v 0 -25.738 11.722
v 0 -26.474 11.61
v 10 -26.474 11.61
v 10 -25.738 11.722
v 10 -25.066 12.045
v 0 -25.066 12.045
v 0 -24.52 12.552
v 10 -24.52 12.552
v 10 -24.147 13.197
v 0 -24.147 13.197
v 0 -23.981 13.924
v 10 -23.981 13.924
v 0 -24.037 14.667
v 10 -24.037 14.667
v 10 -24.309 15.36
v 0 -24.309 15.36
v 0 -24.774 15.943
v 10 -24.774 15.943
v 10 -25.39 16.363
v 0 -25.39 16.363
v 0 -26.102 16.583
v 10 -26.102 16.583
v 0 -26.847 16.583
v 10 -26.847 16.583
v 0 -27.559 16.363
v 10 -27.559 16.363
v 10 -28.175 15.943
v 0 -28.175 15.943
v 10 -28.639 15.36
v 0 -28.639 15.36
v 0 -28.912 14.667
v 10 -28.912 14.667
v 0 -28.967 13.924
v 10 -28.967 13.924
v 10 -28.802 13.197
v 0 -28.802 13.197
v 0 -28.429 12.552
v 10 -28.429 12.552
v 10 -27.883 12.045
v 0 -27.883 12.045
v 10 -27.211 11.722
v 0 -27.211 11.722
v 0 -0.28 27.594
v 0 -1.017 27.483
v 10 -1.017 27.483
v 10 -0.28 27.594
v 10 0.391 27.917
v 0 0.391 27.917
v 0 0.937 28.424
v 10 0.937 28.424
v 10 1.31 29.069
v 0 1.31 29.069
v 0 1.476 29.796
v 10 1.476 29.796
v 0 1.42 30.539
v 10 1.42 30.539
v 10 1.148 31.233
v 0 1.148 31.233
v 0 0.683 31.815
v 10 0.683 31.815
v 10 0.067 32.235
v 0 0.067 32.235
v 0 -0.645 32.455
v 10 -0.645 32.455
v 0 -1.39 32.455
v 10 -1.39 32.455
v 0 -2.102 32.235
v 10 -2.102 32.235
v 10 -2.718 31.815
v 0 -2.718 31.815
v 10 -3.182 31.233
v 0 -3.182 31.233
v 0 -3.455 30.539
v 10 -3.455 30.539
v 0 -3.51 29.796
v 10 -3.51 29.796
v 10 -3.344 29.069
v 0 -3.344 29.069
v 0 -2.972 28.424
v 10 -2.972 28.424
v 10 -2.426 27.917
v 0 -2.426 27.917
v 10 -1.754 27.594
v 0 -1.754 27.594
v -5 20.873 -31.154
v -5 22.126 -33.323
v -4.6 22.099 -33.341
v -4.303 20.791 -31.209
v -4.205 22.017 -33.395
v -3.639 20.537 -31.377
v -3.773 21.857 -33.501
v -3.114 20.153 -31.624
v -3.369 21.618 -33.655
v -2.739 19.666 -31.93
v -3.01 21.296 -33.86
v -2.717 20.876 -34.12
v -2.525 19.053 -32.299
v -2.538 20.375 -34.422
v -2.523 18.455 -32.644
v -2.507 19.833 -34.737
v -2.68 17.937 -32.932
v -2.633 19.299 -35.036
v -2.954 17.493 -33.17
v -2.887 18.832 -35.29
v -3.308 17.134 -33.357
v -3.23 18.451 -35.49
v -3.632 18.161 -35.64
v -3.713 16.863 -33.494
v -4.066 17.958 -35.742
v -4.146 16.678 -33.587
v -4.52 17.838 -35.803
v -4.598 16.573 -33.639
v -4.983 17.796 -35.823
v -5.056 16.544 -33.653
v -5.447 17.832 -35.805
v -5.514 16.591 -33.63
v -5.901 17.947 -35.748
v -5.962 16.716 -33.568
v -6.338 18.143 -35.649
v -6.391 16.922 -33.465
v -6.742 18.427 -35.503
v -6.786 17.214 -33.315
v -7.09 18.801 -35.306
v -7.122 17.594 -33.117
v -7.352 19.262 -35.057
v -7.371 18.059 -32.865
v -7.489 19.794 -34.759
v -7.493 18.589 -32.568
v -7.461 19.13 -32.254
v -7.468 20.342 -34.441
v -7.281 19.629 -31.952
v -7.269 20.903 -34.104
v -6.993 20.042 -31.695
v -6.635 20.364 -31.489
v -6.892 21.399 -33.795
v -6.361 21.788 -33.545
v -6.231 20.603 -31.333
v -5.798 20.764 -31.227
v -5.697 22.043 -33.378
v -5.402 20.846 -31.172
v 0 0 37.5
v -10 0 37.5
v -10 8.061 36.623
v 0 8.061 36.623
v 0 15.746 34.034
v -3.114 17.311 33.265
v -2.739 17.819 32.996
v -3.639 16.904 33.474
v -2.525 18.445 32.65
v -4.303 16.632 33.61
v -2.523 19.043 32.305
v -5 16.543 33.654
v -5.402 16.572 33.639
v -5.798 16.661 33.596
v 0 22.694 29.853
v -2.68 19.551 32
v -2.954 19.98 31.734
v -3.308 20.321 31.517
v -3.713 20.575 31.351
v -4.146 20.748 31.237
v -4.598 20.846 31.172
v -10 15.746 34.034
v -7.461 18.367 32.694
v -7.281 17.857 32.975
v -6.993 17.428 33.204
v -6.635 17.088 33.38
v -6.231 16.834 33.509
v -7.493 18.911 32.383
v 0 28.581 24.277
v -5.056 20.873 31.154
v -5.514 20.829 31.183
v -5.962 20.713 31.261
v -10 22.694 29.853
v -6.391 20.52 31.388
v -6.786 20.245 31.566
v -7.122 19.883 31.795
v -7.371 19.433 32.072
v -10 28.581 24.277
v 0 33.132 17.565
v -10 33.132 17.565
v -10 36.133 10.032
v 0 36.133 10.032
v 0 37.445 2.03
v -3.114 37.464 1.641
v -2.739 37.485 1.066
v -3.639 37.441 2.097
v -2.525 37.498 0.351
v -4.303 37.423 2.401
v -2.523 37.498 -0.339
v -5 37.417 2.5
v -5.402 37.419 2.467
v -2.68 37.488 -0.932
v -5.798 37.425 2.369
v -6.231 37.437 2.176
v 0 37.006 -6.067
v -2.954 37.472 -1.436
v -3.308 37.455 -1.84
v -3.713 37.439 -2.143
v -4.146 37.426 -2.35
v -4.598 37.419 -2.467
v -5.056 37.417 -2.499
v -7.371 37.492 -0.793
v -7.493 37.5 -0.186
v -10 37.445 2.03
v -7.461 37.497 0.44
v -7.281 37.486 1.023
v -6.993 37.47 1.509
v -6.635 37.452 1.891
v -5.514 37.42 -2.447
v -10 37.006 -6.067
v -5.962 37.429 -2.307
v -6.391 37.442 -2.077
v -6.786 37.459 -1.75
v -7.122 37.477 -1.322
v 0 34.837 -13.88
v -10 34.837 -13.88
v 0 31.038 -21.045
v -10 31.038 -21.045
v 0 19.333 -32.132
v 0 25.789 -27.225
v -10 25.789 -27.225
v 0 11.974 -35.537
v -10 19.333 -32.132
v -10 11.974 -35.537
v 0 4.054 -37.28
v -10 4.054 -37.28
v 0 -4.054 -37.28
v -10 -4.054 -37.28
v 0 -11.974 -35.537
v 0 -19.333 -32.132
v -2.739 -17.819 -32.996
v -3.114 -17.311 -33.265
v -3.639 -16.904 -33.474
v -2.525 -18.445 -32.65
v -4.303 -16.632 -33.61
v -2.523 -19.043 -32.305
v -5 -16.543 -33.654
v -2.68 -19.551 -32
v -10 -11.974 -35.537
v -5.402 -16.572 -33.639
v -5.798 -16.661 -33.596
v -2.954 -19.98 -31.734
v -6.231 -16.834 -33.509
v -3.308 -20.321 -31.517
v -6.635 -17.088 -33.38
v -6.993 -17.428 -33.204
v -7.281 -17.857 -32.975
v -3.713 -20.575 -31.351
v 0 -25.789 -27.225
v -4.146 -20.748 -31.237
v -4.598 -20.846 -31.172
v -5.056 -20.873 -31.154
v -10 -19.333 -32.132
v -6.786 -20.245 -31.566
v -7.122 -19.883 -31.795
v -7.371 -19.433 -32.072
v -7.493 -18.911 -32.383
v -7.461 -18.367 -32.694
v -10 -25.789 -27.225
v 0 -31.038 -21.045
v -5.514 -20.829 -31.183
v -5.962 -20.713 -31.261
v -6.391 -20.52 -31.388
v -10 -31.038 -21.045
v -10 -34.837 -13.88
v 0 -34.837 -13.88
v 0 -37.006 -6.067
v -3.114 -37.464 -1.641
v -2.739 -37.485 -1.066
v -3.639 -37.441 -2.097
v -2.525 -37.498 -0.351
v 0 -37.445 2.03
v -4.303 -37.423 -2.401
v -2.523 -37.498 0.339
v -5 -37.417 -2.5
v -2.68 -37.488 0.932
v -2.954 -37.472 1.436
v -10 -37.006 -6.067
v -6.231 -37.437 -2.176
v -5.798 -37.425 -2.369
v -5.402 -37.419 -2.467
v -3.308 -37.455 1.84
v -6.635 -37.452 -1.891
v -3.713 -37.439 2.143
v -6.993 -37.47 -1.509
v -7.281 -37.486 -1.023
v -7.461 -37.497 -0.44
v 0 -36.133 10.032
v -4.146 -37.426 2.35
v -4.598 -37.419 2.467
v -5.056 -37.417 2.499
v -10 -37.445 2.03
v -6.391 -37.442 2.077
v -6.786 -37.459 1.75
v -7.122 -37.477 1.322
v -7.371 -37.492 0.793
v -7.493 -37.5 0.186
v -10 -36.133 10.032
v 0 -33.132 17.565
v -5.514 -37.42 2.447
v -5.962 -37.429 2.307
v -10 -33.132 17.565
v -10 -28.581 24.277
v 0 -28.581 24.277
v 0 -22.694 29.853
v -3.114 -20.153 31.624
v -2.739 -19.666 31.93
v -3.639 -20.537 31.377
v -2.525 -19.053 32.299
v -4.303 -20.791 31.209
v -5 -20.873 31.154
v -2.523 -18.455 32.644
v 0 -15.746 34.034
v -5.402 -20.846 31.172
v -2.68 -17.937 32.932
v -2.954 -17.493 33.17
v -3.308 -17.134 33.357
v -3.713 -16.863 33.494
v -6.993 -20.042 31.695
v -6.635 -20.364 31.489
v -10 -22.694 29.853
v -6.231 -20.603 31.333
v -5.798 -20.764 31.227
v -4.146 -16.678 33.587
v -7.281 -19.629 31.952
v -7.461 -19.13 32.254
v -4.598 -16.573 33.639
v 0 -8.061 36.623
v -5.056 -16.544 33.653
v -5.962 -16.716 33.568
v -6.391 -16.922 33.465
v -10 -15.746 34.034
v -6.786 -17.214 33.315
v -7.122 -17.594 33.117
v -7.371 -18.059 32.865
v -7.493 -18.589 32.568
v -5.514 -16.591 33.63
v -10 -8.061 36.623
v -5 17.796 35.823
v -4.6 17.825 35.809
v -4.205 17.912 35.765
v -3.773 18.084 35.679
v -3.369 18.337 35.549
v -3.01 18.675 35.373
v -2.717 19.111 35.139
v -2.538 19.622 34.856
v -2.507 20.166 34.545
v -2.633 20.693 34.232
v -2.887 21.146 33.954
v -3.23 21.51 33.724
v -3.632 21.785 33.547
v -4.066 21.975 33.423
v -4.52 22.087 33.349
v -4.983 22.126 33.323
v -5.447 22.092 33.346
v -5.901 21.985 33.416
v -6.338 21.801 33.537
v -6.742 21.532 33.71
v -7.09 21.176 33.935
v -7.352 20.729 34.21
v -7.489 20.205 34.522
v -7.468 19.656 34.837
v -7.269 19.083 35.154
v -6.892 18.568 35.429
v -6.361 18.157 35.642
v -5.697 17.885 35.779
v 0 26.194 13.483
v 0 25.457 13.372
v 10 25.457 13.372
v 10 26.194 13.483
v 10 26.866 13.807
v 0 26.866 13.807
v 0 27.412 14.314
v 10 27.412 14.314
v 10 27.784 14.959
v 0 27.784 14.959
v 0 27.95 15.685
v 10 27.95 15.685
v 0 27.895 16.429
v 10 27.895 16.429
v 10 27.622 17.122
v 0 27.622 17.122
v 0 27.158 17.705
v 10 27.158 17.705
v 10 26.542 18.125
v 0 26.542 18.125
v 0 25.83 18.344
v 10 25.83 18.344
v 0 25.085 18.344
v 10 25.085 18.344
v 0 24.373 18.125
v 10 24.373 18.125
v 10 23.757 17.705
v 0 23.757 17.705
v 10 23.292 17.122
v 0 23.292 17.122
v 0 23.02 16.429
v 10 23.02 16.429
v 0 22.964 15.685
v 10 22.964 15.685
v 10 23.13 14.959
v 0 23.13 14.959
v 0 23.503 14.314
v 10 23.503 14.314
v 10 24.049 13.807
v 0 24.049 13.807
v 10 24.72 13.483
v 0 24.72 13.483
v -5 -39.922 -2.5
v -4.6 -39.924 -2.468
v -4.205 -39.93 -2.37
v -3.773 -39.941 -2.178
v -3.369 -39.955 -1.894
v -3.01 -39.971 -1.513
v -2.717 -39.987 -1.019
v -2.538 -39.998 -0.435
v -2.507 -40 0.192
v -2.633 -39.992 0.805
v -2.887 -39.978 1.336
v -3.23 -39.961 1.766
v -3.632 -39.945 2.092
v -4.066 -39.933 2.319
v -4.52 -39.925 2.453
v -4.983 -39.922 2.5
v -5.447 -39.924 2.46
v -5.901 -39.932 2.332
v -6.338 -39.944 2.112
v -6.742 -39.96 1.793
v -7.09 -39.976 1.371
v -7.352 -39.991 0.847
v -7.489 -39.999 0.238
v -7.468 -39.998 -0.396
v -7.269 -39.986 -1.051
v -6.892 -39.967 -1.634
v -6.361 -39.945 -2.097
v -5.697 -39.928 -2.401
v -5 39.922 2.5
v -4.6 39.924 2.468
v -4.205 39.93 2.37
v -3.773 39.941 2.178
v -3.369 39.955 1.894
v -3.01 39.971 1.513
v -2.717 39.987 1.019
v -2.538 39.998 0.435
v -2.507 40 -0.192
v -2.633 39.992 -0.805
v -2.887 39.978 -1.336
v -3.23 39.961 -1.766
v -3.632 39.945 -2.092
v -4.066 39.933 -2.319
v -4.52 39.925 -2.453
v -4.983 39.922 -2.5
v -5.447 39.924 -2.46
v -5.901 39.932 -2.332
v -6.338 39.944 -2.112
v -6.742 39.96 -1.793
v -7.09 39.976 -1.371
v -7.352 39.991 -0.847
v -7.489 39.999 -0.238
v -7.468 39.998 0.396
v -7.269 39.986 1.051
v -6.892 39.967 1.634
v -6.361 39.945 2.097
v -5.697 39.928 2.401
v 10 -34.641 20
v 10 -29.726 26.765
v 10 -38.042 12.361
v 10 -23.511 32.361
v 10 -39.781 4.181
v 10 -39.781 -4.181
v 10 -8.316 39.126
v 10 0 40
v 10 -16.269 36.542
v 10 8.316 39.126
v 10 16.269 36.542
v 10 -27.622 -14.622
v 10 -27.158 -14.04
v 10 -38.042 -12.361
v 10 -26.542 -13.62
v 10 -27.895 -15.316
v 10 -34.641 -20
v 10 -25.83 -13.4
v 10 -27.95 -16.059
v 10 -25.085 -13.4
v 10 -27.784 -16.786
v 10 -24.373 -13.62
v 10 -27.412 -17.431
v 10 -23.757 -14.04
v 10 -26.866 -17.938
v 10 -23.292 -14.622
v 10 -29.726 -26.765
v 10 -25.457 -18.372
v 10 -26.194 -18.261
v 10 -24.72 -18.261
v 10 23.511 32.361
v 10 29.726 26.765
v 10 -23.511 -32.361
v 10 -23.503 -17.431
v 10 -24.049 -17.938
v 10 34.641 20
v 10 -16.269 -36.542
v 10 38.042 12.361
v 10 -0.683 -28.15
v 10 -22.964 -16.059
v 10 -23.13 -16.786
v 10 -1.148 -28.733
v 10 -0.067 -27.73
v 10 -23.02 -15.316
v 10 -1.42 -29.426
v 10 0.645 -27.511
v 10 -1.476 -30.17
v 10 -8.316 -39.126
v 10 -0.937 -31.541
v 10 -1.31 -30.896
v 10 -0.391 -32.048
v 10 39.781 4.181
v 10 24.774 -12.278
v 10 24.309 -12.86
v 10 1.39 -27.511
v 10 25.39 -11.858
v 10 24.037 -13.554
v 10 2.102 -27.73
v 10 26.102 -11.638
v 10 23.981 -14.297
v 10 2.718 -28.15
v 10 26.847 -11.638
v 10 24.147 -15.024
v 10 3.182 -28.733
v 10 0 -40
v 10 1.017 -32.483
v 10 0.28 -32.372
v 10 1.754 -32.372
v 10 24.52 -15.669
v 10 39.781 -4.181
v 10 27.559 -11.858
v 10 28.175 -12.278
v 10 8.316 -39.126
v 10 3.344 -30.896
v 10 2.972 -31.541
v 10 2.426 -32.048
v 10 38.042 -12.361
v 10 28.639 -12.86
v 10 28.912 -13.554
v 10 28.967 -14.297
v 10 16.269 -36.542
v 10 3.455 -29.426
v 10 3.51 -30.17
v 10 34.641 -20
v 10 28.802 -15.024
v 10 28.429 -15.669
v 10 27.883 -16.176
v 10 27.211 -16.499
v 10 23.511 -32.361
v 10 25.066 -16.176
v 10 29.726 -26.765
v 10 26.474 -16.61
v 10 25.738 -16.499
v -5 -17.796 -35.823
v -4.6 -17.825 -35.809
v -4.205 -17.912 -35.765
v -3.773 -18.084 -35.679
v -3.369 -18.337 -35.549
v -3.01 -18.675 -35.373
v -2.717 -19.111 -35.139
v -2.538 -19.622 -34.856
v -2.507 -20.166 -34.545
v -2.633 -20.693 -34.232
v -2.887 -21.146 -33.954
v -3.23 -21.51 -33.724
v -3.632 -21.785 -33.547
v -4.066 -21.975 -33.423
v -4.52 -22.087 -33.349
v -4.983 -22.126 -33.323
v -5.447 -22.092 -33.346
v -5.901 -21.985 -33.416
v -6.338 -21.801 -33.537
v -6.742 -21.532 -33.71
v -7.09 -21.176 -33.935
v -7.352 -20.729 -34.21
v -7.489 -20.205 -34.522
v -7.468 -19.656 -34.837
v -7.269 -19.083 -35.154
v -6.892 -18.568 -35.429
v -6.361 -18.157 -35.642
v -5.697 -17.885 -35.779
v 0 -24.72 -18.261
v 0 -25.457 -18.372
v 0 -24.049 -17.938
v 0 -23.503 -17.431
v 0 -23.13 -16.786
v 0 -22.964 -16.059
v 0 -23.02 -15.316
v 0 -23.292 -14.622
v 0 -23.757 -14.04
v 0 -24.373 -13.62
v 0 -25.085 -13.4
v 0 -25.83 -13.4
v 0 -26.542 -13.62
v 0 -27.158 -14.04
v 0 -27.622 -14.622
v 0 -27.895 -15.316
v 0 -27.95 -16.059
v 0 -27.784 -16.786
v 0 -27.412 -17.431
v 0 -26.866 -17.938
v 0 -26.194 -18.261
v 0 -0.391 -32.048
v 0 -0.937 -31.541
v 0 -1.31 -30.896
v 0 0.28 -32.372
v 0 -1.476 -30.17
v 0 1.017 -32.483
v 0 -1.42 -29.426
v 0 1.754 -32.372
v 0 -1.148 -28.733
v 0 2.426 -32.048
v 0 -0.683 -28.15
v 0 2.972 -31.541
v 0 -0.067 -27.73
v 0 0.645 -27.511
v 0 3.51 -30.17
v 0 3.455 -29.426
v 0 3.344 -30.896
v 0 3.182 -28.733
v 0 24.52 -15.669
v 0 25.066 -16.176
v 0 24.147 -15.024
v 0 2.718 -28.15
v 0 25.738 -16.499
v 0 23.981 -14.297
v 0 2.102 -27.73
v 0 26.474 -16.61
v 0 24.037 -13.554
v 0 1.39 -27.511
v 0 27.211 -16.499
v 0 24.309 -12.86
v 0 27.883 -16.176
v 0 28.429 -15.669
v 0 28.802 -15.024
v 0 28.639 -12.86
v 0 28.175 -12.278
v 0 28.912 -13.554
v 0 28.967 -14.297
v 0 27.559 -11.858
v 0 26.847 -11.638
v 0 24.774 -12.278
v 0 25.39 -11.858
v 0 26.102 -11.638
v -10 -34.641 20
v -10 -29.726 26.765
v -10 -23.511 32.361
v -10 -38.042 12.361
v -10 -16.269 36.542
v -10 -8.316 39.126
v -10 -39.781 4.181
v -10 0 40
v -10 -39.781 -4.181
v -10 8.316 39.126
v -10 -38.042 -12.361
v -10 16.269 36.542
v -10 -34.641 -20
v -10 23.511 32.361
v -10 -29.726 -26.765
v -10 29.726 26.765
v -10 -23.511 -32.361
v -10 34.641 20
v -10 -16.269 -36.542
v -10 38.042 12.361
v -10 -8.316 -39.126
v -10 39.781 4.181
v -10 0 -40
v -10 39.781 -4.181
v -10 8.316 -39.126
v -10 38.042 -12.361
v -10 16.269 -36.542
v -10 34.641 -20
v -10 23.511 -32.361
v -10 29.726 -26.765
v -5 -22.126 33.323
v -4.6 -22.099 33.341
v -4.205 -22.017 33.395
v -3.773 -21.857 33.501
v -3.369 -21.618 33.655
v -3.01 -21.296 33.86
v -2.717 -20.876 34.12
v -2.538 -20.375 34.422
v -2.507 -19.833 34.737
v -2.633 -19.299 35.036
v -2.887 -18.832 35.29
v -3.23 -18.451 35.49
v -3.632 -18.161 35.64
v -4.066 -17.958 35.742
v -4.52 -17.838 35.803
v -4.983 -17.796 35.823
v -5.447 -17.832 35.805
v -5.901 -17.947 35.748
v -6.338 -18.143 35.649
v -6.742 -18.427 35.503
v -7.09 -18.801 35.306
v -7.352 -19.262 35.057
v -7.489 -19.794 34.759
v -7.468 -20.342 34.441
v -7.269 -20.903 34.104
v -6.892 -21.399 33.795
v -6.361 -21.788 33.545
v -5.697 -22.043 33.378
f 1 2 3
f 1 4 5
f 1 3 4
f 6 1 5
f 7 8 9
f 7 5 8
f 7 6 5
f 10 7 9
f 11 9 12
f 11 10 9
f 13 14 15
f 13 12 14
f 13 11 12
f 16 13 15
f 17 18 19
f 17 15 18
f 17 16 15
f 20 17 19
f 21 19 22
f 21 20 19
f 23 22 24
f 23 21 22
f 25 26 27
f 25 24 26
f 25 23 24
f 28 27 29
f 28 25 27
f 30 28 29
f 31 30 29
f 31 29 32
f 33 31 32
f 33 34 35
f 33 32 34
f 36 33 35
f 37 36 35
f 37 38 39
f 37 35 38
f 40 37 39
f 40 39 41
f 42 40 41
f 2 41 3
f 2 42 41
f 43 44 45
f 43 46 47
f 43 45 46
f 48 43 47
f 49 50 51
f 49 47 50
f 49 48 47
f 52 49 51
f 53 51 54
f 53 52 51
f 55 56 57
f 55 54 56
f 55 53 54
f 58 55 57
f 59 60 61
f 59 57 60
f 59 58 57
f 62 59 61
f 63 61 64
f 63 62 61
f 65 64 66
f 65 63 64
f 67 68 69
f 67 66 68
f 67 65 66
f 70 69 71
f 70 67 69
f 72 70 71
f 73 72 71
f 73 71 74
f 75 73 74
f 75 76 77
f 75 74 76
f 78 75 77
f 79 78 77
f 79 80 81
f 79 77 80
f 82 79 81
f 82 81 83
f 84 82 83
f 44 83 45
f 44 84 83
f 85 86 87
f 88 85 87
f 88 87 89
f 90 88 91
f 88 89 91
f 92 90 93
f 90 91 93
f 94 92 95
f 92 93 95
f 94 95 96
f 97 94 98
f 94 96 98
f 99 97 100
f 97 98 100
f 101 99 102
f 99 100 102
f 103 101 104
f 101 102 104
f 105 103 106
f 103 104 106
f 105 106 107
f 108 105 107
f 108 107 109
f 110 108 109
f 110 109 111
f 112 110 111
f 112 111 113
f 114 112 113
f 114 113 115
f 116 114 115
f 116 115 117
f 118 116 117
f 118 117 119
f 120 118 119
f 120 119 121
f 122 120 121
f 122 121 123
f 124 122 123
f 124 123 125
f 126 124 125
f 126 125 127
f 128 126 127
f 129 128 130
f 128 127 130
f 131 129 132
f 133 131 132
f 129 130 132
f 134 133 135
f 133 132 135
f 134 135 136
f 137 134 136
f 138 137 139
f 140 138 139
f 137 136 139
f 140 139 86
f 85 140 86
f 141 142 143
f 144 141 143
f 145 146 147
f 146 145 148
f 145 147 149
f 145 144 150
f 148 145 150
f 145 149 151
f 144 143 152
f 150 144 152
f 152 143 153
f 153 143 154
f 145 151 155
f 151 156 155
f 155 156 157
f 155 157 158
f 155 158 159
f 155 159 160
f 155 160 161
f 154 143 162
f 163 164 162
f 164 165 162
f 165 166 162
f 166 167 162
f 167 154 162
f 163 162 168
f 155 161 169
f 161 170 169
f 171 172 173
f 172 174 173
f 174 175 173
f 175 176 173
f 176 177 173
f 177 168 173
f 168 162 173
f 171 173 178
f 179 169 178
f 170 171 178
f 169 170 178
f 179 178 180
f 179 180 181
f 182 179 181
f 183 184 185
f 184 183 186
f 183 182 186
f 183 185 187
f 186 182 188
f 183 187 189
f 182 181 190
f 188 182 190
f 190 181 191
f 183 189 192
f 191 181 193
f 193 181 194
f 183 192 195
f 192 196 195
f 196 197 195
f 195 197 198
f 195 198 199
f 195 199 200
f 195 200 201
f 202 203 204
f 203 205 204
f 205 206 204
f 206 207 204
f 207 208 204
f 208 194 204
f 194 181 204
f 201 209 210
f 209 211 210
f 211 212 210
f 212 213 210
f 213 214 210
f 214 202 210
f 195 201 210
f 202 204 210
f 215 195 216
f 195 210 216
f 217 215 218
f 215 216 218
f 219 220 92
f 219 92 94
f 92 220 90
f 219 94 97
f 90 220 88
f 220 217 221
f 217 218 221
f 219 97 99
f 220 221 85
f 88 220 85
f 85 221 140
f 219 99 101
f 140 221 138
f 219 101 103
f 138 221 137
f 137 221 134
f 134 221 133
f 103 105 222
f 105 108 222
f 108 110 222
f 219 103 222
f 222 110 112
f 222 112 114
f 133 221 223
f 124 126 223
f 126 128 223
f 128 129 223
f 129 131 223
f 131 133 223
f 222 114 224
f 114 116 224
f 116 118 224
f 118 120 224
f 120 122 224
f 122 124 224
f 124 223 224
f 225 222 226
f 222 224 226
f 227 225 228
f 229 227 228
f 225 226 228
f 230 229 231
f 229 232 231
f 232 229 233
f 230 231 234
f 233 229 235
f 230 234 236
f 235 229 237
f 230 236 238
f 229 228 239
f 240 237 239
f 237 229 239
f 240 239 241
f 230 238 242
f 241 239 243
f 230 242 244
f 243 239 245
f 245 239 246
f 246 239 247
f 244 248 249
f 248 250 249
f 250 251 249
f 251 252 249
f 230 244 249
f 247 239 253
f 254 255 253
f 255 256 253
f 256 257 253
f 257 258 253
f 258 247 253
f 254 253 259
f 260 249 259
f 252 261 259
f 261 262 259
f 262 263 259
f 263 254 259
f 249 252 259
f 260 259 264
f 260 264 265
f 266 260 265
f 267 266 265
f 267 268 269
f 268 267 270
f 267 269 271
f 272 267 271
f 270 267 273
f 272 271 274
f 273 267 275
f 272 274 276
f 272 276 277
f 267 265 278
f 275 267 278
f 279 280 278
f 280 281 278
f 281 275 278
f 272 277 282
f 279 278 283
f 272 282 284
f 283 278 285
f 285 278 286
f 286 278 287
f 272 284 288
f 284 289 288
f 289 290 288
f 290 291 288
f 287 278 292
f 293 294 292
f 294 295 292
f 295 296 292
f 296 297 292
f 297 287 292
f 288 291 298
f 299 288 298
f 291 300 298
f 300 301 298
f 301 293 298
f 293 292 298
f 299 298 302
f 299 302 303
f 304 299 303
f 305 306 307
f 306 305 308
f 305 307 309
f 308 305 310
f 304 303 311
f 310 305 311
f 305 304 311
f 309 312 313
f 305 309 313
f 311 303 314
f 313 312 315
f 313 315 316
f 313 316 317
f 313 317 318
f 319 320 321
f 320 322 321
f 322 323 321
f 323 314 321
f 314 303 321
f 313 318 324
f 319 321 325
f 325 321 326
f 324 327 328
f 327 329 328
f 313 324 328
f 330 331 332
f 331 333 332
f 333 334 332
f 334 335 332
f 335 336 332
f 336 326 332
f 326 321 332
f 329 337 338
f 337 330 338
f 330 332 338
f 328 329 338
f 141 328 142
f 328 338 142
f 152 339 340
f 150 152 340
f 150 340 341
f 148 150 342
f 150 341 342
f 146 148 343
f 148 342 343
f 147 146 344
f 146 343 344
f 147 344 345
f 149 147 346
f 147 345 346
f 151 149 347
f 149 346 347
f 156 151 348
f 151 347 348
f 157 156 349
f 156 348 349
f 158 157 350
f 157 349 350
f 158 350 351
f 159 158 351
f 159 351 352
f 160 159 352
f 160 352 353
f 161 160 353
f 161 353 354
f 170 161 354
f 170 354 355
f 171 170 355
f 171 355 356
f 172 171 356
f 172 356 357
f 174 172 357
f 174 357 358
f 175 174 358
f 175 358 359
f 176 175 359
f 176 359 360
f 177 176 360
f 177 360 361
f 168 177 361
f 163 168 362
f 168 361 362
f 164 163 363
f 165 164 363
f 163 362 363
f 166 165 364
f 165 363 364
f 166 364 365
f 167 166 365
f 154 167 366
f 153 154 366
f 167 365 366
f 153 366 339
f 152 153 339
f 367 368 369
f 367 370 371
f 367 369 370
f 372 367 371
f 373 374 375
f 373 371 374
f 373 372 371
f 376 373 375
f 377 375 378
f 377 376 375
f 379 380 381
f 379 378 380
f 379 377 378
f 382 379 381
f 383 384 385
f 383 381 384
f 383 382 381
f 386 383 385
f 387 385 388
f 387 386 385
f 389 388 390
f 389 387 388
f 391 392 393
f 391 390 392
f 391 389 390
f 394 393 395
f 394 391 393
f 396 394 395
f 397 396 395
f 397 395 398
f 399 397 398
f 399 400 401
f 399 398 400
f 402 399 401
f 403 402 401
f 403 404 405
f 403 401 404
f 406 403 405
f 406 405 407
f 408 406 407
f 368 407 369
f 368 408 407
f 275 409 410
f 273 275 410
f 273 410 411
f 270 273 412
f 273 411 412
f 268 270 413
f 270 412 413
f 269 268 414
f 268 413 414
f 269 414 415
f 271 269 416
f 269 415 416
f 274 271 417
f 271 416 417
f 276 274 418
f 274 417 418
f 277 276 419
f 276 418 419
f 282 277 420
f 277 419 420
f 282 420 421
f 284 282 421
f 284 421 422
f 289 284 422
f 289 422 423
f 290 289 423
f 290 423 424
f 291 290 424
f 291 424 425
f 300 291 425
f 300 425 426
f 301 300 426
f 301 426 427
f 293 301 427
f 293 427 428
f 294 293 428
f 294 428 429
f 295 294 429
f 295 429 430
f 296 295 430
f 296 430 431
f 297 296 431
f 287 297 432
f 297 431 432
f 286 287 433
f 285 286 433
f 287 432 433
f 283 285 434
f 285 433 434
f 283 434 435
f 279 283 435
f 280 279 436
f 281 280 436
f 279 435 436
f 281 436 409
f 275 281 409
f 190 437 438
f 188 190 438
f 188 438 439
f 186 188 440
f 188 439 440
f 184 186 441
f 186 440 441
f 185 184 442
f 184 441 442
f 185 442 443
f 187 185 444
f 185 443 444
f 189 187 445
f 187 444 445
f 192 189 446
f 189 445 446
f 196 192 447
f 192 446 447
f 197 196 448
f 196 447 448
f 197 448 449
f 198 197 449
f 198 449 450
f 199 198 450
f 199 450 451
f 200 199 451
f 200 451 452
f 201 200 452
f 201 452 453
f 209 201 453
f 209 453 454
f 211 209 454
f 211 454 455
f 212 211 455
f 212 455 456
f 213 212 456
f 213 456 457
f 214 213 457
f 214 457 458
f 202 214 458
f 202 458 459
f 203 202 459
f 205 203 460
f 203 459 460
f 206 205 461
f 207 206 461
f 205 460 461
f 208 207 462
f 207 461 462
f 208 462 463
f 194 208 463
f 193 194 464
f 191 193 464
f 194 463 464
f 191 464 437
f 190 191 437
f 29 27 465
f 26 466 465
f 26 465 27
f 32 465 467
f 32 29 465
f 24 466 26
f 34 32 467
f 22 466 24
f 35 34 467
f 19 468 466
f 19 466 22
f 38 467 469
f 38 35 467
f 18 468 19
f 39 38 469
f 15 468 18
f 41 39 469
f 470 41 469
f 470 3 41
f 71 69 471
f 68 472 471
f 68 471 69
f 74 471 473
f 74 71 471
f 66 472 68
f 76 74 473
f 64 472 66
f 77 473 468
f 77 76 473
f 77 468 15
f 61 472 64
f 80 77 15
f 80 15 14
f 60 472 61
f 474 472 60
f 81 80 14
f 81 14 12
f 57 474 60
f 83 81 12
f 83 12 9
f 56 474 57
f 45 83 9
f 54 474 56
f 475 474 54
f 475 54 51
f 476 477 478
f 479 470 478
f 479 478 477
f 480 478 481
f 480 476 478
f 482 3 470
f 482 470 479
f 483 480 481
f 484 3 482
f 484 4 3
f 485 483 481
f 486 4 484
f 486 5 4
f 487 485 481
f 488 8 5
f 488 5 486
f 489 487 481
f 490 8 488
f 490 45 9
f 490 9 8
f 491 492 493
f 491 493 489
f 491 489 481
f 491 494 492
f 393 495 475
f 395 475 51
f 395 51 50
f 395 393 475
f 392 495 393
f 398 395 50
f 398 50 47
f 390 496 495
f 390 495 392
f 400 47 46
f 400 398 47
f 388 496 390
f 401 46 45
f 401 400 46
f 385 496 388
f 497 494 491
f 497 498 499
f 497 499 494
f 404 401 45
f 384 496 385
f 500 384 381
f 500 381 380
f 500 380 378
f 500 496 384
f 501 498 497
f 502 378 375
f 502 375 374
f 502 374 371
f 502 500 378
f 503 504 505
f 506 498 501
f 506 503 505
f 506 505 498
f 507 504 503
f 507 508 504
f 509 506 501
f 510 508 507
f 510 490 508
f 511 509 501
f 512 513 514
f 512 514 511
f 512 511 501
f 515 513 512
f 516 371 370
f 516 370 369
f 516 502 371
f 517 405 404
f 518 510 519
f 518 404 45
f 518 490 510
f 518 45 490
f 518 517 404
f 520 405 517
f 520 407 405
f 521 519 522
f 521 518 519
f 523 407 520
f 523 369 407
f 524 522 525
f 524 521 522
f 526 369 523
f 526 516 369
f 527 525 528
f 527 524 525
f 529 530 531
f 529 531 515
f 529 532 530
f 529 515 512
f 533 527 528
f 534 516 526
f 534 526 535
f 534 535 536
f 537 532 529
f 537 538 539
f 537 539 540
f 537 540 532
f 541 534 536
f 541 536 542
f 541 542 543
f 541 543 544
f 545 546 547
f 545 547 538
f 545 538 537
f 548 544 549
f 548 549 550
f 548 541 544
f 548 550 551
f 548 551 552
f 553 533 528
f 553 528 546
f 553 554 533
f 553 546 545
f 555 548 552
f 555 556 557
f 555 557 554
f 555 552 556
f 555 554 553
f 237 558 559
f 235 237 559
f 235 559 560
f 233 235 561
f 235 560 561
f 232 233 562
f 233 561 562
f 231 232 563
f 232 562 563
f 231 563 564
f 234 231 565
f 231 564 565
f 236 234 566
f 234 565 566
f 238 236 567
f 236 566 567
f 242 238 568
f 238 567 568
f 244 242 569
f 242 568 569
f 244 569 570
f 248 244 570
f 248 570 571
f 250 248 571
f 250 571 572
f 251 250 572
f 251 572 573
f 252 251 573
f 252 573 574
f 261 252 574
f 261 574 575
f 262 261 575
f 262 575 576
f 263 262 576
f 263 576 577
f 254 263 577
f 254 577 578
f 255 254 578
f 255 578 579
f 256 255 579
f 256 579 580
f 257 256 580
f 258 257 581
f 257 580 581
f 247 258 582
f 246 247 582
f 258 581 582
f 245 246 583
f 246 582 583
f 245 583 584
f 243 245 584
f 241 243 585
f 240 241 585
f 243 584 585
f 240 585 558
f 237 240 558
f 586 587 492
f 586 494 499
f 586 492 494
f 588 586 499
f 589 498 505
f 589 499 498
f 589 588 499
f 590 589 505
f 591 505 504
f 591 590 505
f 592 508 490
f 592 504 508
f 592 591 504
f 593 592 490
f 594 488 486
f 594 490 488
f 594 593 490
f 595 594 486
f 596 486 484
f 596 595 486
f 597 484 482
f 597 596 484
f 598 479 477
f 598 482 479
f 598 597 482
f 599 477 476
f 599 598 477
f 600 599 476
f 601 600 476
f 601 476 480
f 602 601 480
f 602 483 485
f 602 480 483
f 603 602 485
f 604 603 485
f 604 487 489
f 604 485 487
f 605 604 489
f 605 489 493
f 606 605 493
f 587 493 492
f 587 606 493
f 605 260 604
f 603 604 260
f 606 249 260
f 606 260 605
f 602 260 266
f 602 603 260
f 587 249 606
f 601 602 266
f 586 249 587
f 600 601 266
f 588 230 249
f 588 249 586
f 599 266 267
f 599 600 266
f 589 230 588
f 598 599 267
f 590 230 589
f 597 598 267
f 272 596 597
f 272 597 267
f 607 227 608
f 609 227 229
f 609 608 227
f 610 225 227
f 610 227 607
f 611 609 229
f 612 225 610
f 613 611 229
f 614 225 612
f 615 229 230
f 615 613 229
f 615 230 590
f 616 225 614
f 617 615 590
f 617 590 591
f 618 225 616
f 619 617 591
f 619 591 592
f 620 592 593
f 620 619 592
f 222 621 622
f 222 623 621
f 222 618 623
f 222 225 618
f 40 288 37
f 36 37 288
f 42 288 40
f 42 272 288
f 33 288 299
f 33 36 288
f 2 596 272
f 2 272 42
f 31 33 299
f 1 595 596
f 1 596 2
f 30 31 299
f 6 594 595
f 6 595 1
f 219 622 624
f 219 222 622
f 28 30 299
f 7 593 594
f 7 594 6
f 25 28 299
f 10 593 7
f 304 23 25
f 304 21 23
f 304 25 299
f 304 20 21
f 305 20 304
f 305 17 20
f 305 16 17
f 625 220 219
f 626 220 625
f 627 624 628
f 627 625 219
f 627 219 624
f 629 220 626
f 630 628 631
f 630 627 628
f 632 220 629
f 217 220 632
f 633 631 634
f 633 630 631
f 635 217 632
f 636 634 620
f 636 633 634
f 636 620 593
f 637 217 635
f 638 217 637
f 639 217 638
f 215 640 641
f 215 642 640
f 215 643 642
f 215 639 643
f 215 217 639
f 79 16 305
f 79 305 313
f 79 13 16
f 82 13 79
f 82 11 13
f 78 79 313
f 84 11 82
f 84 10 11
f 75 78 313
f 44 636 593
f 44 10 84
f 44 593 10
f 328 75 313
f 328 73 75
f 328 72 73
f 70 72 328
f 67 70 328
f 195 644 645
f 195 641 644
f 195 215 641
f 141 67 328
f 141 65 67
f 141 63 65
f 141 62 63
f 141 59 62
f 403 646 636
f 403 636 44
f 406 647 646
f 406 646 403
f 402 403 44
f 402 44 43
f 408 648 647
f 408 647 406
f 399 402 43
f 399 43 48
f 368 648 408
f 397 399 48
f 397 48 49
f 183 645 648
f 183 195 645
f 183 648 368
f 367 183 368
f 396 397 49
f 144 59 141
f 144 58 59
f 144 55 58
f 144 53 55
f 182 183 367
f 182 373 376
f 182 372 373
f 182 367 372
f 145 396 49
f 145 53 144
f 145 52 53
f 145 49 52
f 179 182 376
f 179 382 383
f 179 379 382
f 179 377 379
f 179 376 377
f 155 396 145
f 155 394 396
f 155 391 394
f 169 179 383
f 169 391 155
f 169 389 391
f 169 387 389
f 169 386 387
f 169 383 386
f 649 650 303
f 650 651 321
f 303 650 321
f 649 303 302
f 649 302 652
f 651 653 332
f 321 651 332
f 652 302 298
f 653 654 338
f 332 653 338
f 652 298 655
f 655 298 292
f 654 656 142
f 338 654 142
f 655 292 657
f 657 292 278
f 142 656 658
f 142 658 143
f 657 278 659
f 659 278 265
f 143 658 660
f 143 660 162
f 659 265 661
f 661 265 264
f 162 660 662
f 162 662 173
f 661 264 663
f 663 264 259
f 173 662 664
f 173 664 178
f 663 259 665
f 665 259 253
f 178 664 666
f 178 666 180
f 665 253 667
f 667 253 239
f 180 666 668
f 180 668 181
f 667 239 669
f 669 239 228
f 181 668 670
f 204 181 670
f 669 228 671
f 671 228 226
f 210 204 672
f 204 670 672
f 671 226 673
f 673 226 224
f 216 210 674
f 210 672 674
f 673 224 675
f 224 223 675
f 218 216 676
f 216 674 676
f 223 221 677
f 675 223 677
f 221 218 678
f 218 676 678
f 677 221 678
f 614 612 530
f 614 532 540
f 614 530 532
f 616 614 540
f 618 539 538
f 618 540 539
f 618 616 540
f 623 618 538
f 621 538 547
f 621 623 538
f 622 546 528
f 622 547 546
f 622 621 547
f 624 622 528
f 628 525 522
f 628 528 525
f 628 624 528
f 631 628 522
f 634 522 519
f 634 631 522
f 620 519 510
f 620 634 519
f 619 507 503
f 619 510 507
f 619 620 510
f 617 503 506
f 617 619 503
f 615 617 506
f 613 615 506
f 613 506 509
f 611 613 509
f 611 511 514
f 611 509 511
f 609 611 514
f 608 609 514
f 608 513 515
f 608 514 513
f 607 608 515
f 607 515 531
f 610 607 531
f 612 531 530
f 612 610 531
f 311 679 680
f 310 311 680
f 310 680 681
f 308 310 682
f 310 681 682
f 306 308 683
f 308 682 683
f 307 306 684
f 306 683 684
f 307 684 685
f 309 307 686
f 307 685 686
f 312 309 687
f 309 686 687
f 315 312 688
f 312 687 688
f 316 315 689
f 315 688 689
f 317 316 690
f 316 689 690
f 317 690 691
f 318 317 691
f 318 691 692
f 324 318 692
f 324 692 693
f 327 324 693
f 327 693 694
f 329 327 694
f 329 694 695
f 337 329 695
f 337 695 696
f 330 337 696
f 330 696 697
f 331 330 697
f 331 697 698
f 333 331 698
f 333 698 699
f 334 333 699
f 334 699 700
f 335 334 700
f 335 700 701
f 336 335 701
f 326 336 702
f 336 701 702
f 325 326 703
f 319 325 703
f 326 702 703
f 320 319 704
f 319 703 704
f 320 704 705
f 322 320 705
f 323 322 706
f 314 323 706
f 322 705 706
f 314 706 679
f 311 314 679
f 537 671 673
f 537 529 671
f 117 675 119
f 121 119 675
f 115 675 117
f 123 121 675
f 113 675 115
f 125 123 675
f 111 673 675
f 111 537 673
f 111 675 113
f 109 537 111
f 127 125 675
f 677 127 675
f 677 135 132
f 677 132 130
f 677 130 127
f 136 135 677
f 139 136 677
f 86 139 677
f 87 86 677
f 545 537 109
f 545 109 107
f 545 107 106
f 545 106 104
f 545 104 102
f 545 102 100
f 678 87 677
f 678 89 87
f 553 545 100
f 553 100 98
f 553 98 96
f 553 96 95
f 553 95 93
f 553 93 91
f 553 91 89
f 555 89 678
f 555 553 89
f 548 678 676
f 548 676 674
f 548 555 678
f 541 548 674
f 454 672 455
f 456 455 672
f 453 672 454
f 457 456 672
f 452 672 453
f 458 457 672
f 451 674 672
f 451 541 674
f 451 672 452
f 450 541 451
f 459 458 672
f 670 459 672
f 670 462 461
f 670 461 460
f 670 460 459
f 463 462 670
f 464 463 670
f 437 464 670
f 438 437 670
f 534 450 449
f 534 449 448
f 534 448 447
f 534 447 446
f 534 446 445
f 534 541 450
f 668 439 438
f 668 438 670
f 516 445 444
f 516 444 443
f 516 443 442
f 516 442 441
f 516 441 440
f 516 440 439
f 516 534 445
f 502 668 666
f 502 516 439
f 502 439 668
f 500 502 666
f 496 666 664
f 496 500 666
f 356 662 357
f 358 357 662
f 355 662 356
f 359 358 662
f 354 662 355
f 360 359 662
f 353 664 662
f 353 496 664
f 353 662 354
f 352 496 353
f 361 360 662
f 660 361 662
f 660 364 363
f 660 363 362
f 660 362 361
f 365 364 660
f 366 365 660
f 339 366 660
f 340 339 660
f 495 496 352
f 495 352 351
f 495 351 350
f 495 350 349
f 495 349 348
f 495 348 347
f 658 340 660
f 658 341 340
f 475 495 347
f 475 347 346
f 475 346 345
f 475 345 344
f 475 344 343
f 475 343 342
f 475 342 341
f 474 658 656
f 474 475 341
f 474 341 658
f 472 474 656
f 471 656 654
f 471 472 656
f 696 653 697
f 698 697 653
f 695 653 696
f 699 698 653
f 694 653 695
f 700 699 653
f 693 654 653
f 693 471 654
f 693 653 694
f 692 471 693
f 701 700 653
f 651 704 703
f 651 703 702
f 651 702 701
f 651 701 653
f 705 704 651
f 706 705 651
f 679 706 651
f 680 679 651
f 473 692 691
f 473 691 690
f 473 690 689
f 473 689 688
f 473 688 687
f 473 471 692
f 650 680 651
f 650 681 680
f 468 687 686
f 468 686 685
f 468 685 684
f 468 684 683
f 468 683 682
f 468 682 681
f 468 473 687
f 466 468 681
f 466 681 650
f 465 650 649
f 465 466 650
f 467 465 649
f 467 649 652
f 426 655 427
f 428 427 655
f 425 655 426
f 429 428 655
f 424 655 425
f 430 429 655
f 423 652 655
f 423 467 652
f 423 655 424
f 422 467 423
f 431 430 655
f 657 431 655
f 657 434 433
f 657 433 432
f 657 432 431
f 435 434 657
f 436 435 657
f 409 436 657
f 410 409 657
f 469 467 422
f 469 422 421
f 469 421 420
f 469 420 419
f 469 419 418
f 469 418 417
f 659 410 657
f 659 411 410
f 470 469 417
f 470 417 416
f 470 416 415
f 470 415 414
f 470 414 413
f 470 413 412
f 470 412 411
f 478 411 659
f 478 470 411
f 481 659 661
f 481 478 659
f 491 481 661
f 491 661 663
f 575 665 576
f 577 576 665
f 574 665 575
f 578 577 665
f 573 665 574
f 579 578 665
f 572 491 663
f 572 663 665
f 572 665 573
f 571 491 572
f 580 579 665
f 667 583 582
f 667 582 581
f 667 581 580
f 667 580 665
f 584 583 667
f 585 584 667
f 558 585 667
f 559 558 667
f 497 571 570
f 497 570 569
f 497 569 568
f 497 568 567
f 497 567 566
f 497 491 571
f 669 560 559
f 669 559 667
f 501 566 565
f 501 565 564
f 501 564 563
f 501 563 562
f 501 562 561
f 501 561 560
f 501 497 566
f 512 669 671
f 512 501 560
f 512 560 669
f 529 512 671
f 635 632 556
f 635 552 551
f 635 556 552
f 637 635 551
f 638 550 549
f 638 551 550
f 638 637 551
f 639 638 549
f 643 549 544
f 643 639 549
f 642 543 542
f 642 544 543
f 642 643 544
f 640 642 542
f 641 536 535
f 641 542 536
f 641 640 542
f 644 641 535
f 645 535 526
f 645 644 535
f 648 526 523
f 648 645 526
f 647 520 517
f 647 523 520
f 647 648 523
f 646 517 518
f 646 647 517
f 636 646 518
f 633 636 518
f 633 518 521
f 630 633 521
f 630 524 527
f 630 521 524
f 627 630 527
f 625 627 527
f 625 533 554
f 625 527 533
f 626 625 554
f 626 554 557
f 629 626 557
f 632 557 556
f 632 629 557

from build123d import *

# Parameters (mm, degrees)
SKETCH1_R               = 40
BOSS_EXTRUDE2_DEPTH     = 10
CUT_EXTRUDE1_DEPTH      = 58.445626465
CUT_EXTRUDE1_DEPTH_BACK = 58.445626465
SKETCH2_R               = 2.5
SKETCH3_R               = 37.5
CUT_EXTRUDE2_DEPTH      = 10
CUT_EXTRUDE3_REACH      = 92
CUT_EXTRUDE3_END_RADIUS = 37.5
SKETCH4_R               = 2.5
CIRPATTERN1_COUNT       = 6


with BuildPart() as part:
    # Sketch1 → Boss-Extrude2 (new, symmetric)
    with BuildSketch(Plane(origin=(0, 0, 0), x_dir=(0, 0, -1), z_dir=(1, 0, 0))):
        Circle(SKETCH1_R)
    extrude(amount=BOSS_EXTRUDE2_DEPTH, both=True)

    # Sketch2 → Cut-Extrude1 (cut, two sides: drawn at the far end of the back side and taken through both)
    with BuildSketch(Plane(origin=(0, 0, 0), x_dir=(0, 0, -1), z_dir=(1, 0, 0)).offset(-CUT_EXTRUDE1_DEPTH_BACK)):
        with Locations((14.110434629, 26.474433602)):
            Circle(SKETCH2_R)
        with Locations((29.982749365, 1.017221954)):
            Circle(SKETCH2_R)
        with Locations((15.872314736, -25.457211649)):
            Circle(SKETCH2_R)
        with Locations((-14.110434629, -26.474433602)):
            Circle(SKETCH2_R)
        with Locations((-29.982749365, -1.017221954)):
            Circle(SKETCH2_R)
        with Locations((-15.872314736, 25.457211649)):
            Circle(SKETCH2_R)
    extrude(amount=CUT_EXTRUDE1_DEPTH + CUT_EXTRUDE1_DEPTH_BACK, mode=Mode.SUBTRACT)

    # Sketch3 → Cut-Extrude2 (cut)
    with BuildSketch(Plane.ZY.offset(10)):
        Circle(SKETCH3_R)
    extrude(amount=-CUT_EXTRUDE2_DEPTH, mode=Mode.SUBTRACT)

    # Cut-Extrude3: up to this cylinder (the profile starts outside it)
    cut_extrude3_end = Plane(origin=(-5, 0, 0), z_dir=(-1, 0, 0)) * Cylinder(CUT_EXTRUDE3_END_RADIUS, 260, mode=Mode.PRIVATE)
    # Sketch4 → Cut-Extrude3 (cut, up to the surface)
    with BuildSketch(Plane(origin=(0, 40, 0), x_dir=(1, 0, 0), z_dir=(0, 1, 0)), mode=Mode.PRIVATE) as cut_extrude3_sk1:
        with Locations(Location((-5, 0, 0), (0, 0, 270))):
            Circle(SKETCH4_R)
    cut_extrude3_tool1 = extrude(cut_extrude3_sk1.sketch, amount=-CUT_EXTRUDE3_REACH, mode=Mode.PRIVATE) - cut_extrude3_end
    cut_extrude3 = cut_extrude3_tool1.solids().sort_by_distance((-5, 40, 0))[0]
    add(cut_extrude3, mode=Mode.SUBTRACT)

    # CirPattern1: Cut-Extrude3 ×6 about axis
    cirpattern1_axis = Axis((-10, 0, 0), (1, 0, 0))
    for i in range(1, CIRPATTERN1_COUNT):
        add(cut_extrude3.rotate(cirpattern1_axis, i * 360 / CIRPATTERN1_COUNT), mode=Mode.SUBTRACT)


solid = part.part
